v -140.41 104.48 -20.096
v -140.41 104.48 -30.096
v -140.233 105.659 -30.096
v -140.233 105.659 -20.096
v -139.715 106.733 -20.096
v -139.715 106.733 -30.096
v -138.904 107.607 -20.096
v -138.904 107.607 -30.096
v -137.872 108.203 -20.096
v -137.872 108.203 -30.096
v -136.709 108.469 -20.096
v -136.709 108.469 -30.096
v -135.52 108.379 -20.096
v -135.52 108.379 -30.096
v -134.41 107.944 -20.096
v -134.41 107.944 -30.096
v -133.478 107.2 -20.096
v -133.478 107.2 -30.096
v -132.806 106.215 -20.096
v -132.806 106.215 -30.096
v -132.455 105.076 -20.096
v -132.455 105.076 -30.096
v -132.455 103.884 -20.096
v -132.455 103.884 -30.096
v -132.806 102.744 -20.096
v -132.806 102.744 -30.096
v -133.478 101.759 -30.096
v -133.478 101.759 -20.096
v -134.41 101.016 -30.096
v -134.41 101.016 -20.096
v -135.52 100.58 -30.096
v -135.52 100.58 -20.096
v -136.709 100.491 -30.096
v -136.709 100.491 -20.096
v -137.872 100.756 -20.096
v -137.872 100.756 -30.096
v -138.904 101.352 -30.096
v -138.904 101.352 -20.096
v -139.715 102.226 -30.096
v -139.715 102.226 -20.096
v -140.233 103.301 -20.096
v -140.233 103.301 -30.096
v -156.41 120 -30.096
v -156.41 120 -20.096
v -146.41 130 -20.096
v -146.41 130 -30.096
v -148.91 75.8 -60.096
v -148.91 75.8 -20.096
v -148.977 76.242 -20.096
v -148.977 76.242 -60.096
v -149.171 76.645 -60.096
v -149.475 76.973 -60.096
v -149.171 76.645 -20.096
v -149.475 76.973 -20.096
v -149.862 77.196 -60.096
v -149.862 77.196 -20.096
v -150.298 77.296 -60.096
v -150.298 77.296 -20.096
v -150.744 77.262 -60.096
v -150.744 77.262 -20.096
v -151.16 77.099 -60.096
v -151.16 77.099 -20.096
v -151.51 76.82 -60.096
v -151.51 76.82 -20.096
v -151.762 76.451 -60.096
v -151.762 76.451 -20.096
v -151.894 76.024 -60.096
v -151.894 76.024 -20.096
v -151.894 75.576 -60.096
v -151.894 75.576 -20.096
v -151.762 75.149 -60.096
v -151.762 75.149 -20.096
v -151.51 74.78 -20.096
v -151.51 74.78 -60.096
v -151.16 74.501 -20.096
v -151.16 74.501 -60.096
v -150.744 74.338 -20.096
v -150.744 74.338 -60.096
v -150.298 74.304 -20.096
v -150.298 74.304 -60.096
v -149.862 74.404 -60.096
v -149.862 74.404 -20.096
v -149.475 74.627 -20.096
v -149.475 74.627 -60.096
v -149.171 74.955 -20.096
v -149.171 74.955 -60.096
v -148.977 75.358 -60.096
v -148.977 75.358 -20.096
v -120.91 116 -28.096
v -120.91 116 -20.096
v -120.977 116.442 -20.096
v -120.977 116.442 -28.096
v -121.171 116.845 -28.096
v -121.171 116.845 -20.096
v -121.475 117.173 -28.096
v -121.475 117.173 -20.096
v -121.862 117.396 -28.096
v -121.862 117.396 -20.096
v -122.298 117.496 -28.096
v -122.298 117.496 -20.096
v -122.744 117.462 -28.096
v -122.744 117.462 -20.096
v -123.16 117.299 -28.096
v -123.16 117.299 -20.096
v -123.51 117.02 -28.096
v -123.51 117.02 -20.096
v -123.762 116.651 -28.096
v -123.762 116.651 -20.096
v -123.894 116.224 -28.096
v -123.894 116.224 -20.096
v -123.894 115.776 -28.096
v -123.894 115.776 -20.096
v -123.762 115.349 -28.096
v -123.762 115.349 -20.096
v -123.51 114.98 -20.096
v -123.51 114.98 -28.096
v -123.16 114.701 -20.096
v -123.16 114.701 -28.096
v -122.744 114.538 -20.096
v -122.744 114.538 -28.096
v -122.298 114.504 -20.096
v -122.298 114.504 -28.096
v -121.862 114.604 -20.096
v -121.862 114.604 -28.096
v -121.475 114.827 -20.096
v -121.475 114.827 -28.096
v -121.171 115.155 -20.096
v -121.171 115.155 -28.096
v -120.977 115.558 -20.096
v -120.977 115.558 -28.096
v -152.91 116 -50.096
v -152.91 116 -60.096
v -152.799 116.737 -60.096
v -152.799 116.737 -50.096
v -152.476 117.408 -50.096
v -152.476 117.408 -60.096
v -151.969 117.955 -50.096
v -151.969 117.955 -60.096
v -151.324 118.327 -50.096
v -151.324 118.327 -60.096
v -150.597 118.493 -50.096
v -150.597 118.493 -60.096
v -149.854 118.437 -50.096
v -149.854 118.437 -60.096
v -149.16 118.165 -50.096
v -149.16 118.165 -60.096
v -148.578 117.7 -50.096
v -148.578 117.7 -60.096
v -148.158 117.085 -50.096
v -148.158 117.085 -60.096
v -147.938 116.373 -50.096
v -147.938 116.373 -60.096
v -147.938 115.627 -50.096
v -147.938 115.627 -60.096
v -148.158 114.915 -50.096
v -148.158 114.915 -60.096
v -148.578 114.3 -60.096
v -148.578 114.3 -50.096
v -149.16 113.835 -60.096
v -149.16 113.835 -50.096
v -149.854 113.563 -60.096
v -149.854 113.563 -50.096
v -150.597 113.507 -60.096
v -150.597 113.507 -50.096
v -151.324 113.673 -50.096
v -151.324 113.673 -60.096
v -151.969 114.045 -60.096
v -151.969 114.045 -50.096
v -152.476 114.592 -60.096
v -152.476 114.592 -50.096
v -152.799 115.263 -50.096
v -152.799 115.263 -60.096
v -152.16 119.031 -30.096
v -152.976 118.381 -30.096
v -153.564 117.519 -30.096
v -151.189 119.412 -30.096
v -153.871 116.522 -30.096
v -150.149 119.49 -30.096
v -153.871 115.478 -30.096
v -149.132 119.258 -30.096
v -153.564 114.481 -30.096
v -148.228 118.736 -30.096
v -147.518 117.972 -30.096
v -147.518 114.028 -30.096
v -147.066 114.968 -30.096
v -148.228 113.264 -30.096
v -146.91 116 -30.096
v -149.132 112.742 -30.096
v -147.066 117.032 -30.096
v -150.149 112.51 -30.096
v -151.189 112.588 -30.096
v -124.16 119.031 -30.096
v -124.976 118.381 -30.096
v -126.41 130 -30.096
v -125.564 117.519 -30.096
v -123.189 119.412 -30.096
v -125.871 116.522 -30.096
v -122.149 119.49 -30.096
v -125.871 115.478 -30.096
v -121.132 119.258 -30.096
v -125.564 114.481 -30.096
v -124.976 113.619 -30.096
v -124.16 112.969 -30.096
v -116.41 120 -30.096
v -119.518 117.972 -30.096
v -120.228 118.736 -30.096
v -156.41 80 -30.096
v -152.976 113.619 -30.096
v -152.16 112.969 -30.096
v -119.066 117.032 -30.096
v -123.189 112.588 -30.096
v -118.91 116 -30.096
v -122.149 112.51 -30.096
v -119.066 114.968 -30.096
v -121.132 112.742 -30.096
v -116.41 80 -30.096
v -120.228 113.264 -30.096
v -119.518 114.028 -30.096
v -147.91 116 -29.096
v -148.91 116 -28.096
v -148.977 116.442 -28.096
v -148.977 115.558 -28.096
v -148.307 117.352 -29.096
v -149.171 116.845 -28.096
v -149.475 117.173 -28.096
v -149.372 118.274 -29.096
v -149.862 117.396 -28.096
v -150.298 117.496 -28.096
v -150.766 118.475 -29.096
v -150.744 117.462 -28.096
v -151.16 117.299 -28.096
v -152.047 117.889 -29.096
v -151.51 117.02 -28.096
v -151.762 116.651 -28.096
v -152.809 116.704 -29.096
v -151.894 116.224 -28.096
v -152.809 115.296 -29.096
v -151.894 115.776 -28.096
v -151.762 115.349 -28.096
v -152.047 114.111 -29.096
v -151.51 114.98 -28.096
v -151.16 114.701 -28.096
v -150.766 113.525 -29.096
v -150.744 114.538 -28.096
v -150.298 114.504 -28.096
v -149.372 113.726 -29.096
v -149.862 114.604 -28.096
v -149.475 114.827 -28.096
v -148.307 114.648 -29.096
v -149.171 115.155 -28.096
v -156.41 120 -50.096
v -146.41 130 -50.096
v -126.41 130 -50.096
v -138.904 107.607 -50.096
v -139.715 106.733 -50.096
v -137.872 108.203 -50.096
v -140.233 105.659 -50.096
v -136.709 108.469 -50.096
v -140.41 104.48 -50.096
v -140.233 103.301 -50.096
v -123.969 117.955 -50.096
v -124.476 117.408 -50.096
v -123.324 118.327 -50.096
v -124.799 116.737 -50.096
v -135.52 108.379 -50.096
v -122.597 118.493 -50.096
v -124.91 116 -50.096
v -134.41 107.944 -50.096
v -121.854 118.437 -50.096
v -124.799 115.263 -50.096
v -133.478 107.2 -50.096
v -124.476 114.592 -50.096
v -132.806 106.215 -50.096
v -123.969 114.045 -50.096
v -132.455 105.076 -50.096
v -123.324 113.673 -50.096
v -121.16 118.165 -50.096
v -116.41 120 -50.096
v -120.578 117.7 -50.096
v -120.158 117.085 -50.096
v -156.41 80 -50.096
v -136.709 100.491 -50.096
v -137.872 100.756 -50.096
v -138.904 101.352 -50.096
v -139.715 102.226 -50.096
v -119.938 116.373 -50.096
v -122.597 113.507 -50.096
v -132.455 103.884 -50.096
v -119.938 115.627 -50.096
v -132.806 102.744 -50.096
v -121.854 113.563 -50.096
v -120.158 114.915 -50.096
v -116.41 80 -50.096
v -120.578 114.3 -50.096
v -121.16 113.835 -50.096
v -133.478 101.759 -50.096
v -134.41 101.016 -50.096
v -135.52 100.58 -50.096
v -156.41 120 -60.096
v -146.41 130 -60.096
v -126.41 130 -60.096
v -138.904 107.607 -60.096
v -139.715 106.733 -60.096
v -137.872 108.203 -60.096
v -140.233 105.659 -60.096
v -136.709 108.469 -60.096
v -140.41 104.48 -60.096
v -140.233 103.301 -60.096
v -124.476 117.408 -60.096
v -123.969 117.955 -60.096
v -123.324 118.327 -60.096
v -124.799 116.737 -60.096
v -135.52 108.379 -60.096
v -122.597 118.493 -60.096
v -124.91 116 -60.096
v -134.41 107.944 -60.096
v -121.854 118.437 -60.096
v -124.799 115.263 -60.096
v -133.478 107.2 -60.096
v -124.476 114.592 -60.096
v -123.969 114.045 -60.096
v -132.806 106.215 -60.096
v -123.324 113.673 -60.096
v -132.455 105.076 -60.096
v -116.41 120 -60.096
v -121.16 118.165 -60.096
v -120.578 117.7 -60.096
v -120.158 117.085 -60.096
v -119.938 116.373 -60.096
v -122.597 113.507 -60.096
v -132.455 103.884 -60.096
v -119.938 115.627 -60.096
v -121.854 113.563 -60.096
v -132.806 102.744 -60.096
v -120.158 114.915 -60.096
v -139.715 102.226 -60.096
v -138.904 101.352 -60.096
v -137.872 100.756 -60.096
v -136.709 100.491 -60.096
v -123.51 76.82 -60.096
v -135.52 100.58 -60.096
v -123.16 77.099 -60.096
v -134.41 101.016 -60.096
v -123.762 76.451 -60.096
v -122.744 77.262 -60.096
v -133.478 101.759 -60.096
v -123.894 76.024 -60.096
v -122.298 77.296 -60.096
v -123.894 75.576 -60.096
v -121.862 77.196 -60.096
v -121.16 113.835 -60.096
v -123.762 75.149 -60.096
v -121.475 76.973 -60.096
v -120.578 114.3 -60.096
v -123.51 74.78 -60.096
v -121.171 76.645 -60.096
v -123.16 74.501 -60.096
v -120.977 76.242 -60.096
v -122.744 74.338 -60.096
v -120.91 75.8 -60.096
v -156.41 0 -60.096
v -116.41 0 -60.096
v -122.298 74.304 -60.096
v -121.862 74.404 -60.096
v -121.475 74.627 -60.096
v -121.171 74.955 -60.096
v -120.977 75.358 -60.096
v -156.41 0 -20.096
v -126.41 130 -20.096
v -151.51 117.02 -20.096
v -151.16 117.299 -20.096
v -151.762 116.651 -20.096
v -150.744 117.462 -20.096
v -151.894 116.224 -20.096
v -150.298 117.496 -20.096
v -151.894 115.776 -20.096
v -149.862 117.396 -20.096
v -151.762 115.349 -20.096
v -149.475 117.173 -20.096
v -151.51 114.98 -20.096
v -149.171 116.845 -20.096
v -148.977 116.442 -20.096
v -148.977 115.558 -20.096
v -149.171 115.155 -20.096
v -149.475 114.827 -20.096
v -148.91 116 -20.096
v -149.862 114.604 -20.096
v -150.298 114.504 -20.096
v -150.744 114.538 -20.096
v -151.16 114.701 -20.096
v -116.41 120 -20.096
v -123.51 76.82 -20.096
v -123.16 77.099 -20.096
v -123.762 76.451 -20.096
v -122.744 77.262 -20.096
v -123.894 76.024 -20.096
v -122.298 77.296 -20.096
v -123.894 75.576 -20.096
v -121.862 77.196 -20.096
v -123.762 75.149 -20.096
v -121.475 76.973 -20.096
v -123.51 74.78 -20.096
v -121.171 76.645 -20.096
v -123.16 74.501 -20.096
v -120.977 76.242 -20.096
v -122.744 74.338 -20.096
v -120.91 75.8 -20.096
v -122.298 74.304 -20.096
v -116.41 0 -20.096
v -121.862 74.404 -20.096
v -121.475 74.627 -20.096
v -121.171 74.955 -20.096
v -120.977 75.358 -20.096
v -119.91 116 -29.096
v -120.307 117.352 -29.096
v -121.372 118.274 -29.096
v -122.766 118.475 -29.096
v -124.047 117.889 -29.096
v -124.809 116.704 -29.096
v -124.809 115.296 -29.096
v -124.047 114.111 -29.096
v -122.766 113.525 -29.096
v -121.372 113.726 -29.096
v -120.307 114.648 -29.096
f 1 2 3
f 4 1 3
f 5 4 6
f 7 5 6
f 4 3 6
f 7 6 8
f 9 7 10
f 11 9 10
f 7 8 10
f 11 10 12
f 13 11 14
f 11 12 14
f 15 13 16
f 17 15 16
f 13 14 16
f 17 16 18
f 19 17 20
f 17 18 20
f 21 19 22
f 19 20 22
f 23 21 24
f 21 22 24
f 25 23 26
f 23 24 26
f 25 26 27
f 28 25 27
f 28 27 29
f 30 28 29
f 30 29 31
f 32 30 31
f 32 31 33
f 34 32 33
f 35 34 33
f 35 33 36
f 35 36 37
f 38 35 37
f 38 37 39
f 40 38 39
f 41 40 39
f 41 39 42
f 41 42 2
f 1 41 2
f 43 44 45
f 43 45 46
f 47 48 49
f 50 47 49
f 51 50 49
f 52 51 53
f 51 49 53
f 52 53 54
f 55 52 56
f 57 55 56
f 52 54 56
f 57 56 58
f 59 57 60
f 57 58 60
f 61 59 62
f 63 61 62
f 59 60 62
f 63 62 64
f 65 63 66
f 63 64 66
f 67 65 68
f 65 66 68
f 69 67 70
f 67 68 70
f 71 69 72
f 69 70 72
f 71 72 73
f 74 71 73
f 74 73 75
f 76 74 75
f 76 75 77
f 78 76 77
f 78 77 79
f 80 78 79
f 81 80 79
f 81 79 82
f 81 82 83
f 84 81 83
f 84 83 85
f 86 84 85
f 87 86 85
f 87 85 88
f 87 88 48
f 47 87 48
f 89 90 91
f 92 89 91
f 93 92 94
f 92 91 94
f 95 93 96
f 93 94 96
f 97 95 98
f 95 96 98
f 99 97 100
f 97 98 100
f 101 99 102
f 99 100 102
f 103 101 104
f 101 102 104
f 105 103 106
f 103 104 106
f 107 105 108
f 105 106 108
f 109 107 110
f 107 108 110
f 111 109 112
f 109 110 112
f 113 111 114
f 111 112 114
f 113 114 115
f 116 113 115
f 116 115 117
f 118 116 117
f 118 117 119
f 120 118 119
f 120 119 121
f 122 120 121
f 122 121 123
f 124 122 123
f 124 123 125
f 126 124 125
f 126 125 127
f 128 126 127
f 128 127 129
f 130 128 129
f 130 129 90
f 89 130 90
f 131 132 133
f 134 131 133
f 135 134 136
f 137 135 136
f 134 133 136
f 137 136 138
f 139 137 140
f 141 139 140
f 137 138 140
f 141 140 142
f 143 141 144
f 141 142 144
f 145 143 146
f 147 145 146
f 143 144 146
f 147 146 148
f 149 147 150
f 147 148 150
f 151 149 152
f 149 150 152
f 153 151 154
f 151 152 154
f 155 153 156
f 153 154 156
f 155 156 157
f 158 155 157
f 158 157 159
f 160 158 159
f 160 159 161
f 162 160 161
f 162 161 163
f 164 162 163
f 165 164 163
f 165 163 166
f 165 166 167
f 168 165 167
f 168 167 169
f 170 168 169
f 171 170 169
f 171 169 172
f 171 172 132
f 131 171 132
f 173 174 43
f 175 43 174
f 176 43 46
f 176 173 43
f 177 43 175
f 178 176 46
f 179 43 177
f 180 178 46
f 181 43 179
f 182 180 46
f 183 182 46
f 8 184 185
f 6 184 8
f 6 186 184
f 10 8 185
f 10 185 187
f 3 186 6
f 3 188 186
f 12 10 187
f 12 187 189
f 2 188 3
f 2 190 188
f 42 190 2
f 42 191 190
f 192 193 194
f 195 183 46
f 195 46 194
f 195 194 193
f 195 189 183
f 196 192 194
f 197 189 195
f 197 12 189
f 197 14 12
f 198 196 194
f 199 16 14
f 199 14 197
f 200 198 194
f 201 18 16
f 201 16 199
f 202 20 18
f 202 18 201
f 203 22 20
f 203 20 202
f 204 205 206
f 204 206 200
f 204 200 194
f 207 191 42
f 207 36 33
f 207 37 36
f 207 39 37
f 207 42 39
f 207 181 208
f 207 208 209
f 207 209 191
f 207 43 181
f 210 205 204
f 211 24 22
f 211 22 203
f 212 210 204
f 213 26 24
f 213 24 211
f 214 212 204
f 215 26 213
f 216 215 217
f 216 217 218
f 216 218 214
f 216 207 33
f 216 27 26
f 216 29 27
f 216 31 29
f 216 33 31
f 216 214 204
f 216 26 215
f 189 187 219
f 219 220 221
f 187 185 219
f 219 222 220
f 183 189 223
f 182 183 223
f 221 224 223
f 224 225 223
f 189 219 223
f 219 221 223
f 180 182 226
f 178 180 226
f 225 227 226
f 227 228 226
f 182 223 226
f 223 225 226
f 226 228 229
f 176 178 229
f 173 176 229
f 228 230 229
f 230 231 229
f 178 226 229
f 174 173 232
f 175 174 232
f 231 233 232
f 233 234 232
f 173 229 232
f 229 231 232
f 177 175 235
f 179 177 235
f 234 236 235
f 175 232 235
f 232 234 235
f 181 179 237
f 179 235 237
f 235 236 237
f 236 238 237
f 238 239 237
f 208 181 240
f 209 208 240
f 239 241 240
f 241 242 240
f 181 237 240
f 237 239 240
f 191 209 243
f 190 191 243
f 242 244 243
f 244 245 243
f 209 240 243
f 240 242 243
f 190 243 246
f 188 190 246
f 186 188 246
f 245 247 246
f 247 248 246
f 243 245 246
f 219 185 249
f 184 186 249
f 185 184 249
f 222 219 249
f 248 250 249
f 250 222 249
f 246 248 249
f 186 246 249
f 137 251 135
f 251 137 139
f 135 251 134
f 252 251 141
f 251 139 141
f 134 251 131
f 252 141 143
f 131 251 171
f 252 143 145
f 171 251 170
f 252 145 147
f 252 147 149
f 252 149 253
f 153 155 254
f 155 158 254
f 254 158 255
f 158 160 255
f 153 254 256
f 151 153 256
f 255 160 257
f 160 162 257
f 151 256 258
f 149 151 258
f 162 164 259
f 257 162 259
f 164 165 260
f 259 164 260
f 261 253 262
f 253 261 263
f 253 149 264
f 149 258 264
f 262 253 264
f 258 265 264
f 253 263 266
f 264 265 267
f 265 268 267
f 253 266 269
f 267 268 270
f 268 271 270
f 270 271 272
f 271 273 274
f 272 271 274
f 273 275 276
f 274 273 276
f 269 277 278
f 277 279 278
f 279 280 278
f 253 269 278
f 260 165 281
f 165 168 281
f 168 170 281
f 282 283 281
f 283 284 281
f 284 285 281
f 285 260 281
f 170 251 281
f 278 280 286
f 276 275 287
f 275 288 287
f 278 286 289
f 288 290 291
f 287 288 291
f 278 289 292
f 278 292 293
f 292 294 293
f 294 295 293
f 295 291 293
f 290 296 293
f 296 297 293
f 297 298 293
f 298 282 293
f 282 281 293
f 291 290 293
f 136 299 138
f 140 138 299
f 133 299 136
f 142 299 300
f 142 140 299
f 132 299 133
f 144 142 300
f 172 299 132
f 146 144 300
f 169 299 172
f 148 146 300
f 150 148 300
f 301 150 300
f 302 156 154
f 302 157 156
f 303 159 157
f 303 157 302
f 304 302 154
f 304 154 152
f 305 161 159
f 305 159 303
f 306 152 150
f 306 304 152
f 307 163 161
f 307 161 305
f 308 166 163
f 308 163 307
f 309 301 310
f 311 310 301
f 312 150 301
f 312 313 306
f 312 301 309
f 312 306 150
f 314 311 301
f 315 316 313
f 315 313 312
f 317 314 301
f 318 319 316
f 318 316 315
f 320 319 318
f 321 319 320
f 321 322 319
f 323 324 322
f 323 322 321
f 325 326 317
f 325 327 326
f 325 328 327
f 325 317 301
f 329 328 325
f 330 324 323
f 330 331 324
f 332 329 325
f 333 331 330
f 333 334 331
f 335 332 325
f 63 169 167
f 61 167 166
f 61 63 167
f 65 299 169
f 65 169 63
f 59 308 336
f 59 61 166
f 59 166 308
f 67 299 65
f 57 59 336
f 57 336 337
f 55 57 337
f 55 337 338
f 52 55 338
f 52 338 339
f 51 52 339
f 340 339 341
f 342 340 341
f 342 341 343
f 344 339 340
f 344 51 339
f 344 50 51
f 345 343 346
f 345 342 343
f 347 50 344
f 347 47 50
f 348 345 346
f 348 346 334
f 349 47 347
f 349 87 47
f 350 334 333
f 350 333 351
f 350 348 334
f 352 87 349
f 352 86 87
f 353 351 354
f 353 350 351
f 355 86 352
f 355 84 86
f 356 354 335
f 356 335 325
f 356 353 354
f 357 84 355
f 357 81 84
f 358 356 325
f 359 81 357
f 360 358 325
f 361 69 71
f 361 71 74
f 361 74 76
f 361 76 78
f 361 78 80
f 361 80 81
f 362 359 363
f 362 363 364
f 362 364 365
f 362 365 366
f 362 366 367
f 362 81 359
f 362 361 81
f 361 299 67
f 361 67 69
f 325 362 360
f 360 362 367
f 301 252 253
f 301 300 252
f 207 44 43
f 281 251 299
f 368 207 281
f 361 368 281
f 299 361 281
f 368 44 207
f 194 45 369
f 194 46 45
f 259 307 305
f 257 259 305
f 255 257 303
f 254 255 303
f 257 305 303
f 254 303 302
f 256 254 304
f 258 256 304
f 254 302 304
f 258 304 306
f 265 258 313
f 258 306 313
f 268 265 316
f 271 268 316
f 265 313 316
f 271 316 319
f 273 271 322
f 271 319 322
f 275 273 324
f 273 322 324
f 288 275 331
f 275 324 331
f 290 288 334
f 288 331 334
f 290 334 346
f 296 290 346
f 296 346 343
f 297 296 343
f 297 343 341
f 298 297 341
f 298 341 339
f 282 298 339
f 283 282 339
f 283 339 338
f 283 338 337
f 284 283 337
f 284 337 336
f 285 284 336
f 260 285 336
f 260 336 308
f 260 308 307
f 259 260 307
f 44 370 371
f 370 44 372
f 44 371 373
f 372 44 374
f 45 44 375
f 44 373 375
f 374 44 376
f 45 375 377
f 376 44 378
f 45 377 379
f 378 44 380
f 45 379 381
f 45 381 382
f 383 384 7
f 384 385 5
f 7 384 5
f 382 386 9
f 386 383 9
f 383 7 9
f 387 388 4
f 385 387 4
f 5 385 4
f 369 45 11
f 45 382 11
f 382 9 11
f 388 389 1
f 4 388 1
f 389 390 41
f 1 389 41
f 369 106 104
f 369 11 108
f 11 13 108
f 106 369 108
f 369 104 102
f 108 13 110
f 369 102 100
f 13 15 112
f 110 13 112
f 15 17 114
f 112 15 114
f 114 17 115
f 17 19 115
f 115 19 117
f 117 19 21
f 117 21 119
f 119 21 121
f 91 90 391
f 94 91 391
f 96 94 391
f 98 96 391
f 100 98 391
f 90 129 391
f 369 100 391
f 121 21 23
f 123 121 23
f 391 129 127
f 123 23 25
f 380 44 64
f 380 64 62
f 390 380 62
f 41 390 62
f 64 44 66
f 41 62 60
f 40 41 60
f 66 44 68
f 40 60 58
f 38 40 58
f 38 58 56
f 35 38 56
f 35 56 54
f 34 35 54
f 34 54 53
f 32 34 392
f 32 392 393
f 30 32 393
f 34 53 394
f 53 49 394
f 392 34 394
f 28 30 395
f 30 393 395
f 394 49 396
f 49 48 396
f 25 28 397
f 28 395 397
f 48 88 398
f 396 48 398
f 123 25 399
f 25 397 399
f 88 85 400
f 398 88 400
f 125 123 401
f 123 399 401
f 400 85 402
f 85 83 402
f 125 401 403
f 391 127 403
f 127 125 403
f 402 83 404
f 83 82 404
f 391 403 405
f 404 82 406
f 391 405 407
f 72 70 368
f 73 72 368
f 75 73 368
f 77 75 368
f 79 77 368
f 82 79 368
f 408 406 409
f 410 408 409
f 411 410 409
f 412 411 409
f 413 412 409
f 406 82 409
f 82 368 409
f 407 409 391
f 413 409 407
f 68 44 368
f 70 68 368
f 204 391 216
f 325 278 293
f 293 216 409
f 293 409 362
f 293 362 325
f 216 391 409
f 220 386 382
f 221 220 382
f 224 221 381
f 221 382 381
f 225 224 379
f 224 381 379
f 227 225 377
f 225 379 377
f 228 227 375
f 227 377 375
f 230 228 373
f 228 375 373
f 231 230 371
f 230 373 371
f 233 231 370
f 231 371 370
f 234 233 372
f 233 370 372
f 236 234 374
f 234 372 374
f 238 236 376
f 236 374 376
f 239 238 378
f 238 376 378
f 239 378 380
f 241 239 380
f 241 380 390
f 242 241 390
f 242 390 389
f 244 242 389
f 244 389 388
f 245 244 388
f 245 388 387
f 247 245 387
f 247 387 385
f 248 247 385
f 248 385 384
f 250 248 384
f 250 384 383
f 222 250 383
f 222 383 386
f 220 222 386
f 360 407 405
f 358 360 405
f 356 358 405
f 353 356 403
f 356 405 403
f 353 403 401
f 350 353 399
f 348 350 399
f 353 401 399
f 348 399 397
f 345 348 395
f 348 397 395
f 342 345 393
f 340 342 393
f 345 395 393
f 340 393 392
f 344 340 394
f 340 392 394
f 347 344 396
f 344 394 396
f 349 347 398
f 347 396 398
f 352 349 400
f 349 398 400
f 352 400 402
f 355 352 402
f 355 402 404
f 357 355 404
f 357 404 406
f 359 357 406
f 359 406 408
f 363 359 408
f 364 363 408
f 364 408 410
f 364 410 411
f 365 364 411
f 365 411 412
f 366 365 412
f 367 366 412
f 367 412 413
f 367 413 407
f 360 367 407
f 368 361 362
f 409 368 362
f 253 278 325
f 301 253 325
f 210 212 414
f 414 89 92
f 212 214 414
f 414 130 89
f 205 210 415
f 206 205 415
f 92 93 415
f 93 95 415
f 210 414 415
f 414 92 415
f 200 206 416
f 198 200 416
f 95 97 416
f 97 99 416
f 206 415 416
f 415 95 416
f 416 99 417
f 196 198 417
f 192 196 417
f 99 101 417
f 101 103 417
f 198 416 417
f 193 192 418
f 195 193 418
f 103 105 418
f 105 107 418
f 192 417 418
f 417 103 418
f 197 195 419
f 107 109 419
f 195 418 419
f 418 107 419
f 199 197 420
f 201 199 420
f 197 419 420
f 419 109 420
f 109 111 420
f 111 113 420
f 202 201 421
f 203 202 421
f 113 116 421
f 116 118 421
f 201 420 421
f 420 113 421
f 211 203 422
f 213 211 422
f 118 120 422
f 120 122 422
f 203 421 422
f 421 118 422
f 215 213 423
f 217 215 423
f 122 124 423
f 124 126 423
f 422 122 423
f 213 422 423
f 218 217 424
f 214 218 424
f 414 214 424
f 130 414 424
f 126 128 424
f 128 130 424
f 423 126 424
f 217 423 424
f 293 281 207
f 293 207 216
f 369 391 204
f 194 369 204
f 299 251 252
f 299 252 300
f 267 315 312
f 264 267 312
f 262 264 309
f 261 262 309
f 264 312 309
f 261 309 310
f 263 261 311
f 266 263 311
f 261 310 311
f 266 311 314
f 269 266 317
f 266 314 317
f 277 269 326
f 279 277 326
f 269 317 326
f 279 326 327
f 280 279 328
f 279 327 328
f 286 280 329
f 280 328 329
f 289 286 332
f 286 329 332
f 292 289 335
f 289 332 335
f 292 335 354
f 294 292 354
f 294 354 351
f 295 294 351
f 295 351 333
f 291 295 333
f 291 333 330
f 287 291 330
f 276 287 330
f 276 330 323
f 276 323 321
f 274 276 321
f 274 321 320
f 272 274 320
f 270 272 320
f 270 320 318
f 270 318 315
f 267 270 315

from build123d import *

# Parameters (mm, degrees)
SKETCH1_W           = 40
SKETCH1_H           = 40
BOSS_EXTRUDE1_DEPTH = 80
SKETCH4_W           = 40
SKETCH4_H           = 10
BOSS_EXTRUDE2_DEPTH = 50
CHAMFER1_SIZE       = 10
SKETCH5_R           = 4
CUT_EXTRUDE1_DEPTH  = 60
SKETCH6_R           = 1.5
CUT_EXTRUDE2_DEPTH  = 60
CHAMFER2_SIZE       = 2
SKETCH7_R           = 2.5
CUT_EXTRUDE3_DEPTH  = 20


with BuildPart() as part:
    # Sketch1 → Boss-Extrude1 (new body)
    with BuildSketch(Plane(origin=(0, 0, 0), x_dir=(1, 0, 0), z_dir=(0, 1, 0))):
        with Locations((-136.41025641, 40.096153846)):
            Rectangle(SKETCH1_W, SKETCH1_H)
    extrude(amount=BOSS_EXTRUDE1_DEPTH)

    # Sketch4 → Boss-Extrude2 (add)
    with BuildSketch(Plane(origin=(0, 80, 0), x_dir=(1, 0, 0), z_dir=(0, 1, 0))):
        with Locations((-136.41025641, 25.096153846)):
            Rectangle(SKETCH4_W, SKETCH4_H)
        with Locations((-136.41025641, 55.096153846)):
            Rectangle(SKETCH4_W, SKETCH4_H)
    extrude(amount=BOSS_EXTRUDE2_DEPTH)

    # Chamfer1
    chamfer1_edges = [part.edges().sort_by_distance(p)[0] for p in [
        (-156.41025641, 130, -25.096153846),
        (-116.41025641, 130, -25.096153846),
        (-156.41025641, 130, -55.096153846),
        (-116.41025641, 130, -55.096153846),
    ]]
    chamfer(chamfer1_edges, length=CHAMFER1_SIZE)

    # Sketch5 → Cut-Extrude1 (cut)
    with BuildSketch(Plane(origin=(0, 0, -60.096153846), x_dir=(-1, 0, 0), z_dir=(0, 0, -1))):
        with Locations((136.41025641, 104.479752215)):
            Circle(SKETCH5_R)
    extrude(amount=-CUT_EXTRUDE1_DEPTH, mode=Mode.SUBTRACT)

    # Sketch6 → Cut-Extrude2 (cut)
    with BuildSketch(Plane.XY.offset(-20.096153846)):
        with Locations((-150.41025641, 75.8)):
            Circle(SKETCH6_R)
        with Locations((-150.41025641, 116)):
            Circle(SKETCH6_R)
        with Locations((-122.41025641, 116)):
            Circle(SKETCH6_R)
        with Locations((-122.41025641, 75.8)):
            Circle(SKETCH6_R)
    extrude(amount=-CUT_EXTRUDE2_DEPTH, mode=Mode.SUBTRACT)

    # Chamfer2
    chamfer2_edges = [part.edges().sort_by_distance(p)[0] for p in [
        (-123.91025641, 116, -30.096153846),
        (-151.91025641, 116, -30.096153846),
    ]]
    chamfer(chamfer2_edges, length=CHAMFER2_SIZE)

    # Sketch7 → Cut-Extrude3 (cut)
    with BuildSketch(Plane(origin=(0, 0, -60.096153846), x_dir=(-1, 0, 0), z_dir=(0, 0, -1))):
        with Locations((150.41025641, 116)):
            Circle(SKETCH7_R)
        with Locations((122.41025641, 116)):
            Circle(SKETCH7_R)
    extrude(amount=-CUT_EXTRUDE3_DEPTH, mode=Mode.SUBTRACT)


solid = part.part
